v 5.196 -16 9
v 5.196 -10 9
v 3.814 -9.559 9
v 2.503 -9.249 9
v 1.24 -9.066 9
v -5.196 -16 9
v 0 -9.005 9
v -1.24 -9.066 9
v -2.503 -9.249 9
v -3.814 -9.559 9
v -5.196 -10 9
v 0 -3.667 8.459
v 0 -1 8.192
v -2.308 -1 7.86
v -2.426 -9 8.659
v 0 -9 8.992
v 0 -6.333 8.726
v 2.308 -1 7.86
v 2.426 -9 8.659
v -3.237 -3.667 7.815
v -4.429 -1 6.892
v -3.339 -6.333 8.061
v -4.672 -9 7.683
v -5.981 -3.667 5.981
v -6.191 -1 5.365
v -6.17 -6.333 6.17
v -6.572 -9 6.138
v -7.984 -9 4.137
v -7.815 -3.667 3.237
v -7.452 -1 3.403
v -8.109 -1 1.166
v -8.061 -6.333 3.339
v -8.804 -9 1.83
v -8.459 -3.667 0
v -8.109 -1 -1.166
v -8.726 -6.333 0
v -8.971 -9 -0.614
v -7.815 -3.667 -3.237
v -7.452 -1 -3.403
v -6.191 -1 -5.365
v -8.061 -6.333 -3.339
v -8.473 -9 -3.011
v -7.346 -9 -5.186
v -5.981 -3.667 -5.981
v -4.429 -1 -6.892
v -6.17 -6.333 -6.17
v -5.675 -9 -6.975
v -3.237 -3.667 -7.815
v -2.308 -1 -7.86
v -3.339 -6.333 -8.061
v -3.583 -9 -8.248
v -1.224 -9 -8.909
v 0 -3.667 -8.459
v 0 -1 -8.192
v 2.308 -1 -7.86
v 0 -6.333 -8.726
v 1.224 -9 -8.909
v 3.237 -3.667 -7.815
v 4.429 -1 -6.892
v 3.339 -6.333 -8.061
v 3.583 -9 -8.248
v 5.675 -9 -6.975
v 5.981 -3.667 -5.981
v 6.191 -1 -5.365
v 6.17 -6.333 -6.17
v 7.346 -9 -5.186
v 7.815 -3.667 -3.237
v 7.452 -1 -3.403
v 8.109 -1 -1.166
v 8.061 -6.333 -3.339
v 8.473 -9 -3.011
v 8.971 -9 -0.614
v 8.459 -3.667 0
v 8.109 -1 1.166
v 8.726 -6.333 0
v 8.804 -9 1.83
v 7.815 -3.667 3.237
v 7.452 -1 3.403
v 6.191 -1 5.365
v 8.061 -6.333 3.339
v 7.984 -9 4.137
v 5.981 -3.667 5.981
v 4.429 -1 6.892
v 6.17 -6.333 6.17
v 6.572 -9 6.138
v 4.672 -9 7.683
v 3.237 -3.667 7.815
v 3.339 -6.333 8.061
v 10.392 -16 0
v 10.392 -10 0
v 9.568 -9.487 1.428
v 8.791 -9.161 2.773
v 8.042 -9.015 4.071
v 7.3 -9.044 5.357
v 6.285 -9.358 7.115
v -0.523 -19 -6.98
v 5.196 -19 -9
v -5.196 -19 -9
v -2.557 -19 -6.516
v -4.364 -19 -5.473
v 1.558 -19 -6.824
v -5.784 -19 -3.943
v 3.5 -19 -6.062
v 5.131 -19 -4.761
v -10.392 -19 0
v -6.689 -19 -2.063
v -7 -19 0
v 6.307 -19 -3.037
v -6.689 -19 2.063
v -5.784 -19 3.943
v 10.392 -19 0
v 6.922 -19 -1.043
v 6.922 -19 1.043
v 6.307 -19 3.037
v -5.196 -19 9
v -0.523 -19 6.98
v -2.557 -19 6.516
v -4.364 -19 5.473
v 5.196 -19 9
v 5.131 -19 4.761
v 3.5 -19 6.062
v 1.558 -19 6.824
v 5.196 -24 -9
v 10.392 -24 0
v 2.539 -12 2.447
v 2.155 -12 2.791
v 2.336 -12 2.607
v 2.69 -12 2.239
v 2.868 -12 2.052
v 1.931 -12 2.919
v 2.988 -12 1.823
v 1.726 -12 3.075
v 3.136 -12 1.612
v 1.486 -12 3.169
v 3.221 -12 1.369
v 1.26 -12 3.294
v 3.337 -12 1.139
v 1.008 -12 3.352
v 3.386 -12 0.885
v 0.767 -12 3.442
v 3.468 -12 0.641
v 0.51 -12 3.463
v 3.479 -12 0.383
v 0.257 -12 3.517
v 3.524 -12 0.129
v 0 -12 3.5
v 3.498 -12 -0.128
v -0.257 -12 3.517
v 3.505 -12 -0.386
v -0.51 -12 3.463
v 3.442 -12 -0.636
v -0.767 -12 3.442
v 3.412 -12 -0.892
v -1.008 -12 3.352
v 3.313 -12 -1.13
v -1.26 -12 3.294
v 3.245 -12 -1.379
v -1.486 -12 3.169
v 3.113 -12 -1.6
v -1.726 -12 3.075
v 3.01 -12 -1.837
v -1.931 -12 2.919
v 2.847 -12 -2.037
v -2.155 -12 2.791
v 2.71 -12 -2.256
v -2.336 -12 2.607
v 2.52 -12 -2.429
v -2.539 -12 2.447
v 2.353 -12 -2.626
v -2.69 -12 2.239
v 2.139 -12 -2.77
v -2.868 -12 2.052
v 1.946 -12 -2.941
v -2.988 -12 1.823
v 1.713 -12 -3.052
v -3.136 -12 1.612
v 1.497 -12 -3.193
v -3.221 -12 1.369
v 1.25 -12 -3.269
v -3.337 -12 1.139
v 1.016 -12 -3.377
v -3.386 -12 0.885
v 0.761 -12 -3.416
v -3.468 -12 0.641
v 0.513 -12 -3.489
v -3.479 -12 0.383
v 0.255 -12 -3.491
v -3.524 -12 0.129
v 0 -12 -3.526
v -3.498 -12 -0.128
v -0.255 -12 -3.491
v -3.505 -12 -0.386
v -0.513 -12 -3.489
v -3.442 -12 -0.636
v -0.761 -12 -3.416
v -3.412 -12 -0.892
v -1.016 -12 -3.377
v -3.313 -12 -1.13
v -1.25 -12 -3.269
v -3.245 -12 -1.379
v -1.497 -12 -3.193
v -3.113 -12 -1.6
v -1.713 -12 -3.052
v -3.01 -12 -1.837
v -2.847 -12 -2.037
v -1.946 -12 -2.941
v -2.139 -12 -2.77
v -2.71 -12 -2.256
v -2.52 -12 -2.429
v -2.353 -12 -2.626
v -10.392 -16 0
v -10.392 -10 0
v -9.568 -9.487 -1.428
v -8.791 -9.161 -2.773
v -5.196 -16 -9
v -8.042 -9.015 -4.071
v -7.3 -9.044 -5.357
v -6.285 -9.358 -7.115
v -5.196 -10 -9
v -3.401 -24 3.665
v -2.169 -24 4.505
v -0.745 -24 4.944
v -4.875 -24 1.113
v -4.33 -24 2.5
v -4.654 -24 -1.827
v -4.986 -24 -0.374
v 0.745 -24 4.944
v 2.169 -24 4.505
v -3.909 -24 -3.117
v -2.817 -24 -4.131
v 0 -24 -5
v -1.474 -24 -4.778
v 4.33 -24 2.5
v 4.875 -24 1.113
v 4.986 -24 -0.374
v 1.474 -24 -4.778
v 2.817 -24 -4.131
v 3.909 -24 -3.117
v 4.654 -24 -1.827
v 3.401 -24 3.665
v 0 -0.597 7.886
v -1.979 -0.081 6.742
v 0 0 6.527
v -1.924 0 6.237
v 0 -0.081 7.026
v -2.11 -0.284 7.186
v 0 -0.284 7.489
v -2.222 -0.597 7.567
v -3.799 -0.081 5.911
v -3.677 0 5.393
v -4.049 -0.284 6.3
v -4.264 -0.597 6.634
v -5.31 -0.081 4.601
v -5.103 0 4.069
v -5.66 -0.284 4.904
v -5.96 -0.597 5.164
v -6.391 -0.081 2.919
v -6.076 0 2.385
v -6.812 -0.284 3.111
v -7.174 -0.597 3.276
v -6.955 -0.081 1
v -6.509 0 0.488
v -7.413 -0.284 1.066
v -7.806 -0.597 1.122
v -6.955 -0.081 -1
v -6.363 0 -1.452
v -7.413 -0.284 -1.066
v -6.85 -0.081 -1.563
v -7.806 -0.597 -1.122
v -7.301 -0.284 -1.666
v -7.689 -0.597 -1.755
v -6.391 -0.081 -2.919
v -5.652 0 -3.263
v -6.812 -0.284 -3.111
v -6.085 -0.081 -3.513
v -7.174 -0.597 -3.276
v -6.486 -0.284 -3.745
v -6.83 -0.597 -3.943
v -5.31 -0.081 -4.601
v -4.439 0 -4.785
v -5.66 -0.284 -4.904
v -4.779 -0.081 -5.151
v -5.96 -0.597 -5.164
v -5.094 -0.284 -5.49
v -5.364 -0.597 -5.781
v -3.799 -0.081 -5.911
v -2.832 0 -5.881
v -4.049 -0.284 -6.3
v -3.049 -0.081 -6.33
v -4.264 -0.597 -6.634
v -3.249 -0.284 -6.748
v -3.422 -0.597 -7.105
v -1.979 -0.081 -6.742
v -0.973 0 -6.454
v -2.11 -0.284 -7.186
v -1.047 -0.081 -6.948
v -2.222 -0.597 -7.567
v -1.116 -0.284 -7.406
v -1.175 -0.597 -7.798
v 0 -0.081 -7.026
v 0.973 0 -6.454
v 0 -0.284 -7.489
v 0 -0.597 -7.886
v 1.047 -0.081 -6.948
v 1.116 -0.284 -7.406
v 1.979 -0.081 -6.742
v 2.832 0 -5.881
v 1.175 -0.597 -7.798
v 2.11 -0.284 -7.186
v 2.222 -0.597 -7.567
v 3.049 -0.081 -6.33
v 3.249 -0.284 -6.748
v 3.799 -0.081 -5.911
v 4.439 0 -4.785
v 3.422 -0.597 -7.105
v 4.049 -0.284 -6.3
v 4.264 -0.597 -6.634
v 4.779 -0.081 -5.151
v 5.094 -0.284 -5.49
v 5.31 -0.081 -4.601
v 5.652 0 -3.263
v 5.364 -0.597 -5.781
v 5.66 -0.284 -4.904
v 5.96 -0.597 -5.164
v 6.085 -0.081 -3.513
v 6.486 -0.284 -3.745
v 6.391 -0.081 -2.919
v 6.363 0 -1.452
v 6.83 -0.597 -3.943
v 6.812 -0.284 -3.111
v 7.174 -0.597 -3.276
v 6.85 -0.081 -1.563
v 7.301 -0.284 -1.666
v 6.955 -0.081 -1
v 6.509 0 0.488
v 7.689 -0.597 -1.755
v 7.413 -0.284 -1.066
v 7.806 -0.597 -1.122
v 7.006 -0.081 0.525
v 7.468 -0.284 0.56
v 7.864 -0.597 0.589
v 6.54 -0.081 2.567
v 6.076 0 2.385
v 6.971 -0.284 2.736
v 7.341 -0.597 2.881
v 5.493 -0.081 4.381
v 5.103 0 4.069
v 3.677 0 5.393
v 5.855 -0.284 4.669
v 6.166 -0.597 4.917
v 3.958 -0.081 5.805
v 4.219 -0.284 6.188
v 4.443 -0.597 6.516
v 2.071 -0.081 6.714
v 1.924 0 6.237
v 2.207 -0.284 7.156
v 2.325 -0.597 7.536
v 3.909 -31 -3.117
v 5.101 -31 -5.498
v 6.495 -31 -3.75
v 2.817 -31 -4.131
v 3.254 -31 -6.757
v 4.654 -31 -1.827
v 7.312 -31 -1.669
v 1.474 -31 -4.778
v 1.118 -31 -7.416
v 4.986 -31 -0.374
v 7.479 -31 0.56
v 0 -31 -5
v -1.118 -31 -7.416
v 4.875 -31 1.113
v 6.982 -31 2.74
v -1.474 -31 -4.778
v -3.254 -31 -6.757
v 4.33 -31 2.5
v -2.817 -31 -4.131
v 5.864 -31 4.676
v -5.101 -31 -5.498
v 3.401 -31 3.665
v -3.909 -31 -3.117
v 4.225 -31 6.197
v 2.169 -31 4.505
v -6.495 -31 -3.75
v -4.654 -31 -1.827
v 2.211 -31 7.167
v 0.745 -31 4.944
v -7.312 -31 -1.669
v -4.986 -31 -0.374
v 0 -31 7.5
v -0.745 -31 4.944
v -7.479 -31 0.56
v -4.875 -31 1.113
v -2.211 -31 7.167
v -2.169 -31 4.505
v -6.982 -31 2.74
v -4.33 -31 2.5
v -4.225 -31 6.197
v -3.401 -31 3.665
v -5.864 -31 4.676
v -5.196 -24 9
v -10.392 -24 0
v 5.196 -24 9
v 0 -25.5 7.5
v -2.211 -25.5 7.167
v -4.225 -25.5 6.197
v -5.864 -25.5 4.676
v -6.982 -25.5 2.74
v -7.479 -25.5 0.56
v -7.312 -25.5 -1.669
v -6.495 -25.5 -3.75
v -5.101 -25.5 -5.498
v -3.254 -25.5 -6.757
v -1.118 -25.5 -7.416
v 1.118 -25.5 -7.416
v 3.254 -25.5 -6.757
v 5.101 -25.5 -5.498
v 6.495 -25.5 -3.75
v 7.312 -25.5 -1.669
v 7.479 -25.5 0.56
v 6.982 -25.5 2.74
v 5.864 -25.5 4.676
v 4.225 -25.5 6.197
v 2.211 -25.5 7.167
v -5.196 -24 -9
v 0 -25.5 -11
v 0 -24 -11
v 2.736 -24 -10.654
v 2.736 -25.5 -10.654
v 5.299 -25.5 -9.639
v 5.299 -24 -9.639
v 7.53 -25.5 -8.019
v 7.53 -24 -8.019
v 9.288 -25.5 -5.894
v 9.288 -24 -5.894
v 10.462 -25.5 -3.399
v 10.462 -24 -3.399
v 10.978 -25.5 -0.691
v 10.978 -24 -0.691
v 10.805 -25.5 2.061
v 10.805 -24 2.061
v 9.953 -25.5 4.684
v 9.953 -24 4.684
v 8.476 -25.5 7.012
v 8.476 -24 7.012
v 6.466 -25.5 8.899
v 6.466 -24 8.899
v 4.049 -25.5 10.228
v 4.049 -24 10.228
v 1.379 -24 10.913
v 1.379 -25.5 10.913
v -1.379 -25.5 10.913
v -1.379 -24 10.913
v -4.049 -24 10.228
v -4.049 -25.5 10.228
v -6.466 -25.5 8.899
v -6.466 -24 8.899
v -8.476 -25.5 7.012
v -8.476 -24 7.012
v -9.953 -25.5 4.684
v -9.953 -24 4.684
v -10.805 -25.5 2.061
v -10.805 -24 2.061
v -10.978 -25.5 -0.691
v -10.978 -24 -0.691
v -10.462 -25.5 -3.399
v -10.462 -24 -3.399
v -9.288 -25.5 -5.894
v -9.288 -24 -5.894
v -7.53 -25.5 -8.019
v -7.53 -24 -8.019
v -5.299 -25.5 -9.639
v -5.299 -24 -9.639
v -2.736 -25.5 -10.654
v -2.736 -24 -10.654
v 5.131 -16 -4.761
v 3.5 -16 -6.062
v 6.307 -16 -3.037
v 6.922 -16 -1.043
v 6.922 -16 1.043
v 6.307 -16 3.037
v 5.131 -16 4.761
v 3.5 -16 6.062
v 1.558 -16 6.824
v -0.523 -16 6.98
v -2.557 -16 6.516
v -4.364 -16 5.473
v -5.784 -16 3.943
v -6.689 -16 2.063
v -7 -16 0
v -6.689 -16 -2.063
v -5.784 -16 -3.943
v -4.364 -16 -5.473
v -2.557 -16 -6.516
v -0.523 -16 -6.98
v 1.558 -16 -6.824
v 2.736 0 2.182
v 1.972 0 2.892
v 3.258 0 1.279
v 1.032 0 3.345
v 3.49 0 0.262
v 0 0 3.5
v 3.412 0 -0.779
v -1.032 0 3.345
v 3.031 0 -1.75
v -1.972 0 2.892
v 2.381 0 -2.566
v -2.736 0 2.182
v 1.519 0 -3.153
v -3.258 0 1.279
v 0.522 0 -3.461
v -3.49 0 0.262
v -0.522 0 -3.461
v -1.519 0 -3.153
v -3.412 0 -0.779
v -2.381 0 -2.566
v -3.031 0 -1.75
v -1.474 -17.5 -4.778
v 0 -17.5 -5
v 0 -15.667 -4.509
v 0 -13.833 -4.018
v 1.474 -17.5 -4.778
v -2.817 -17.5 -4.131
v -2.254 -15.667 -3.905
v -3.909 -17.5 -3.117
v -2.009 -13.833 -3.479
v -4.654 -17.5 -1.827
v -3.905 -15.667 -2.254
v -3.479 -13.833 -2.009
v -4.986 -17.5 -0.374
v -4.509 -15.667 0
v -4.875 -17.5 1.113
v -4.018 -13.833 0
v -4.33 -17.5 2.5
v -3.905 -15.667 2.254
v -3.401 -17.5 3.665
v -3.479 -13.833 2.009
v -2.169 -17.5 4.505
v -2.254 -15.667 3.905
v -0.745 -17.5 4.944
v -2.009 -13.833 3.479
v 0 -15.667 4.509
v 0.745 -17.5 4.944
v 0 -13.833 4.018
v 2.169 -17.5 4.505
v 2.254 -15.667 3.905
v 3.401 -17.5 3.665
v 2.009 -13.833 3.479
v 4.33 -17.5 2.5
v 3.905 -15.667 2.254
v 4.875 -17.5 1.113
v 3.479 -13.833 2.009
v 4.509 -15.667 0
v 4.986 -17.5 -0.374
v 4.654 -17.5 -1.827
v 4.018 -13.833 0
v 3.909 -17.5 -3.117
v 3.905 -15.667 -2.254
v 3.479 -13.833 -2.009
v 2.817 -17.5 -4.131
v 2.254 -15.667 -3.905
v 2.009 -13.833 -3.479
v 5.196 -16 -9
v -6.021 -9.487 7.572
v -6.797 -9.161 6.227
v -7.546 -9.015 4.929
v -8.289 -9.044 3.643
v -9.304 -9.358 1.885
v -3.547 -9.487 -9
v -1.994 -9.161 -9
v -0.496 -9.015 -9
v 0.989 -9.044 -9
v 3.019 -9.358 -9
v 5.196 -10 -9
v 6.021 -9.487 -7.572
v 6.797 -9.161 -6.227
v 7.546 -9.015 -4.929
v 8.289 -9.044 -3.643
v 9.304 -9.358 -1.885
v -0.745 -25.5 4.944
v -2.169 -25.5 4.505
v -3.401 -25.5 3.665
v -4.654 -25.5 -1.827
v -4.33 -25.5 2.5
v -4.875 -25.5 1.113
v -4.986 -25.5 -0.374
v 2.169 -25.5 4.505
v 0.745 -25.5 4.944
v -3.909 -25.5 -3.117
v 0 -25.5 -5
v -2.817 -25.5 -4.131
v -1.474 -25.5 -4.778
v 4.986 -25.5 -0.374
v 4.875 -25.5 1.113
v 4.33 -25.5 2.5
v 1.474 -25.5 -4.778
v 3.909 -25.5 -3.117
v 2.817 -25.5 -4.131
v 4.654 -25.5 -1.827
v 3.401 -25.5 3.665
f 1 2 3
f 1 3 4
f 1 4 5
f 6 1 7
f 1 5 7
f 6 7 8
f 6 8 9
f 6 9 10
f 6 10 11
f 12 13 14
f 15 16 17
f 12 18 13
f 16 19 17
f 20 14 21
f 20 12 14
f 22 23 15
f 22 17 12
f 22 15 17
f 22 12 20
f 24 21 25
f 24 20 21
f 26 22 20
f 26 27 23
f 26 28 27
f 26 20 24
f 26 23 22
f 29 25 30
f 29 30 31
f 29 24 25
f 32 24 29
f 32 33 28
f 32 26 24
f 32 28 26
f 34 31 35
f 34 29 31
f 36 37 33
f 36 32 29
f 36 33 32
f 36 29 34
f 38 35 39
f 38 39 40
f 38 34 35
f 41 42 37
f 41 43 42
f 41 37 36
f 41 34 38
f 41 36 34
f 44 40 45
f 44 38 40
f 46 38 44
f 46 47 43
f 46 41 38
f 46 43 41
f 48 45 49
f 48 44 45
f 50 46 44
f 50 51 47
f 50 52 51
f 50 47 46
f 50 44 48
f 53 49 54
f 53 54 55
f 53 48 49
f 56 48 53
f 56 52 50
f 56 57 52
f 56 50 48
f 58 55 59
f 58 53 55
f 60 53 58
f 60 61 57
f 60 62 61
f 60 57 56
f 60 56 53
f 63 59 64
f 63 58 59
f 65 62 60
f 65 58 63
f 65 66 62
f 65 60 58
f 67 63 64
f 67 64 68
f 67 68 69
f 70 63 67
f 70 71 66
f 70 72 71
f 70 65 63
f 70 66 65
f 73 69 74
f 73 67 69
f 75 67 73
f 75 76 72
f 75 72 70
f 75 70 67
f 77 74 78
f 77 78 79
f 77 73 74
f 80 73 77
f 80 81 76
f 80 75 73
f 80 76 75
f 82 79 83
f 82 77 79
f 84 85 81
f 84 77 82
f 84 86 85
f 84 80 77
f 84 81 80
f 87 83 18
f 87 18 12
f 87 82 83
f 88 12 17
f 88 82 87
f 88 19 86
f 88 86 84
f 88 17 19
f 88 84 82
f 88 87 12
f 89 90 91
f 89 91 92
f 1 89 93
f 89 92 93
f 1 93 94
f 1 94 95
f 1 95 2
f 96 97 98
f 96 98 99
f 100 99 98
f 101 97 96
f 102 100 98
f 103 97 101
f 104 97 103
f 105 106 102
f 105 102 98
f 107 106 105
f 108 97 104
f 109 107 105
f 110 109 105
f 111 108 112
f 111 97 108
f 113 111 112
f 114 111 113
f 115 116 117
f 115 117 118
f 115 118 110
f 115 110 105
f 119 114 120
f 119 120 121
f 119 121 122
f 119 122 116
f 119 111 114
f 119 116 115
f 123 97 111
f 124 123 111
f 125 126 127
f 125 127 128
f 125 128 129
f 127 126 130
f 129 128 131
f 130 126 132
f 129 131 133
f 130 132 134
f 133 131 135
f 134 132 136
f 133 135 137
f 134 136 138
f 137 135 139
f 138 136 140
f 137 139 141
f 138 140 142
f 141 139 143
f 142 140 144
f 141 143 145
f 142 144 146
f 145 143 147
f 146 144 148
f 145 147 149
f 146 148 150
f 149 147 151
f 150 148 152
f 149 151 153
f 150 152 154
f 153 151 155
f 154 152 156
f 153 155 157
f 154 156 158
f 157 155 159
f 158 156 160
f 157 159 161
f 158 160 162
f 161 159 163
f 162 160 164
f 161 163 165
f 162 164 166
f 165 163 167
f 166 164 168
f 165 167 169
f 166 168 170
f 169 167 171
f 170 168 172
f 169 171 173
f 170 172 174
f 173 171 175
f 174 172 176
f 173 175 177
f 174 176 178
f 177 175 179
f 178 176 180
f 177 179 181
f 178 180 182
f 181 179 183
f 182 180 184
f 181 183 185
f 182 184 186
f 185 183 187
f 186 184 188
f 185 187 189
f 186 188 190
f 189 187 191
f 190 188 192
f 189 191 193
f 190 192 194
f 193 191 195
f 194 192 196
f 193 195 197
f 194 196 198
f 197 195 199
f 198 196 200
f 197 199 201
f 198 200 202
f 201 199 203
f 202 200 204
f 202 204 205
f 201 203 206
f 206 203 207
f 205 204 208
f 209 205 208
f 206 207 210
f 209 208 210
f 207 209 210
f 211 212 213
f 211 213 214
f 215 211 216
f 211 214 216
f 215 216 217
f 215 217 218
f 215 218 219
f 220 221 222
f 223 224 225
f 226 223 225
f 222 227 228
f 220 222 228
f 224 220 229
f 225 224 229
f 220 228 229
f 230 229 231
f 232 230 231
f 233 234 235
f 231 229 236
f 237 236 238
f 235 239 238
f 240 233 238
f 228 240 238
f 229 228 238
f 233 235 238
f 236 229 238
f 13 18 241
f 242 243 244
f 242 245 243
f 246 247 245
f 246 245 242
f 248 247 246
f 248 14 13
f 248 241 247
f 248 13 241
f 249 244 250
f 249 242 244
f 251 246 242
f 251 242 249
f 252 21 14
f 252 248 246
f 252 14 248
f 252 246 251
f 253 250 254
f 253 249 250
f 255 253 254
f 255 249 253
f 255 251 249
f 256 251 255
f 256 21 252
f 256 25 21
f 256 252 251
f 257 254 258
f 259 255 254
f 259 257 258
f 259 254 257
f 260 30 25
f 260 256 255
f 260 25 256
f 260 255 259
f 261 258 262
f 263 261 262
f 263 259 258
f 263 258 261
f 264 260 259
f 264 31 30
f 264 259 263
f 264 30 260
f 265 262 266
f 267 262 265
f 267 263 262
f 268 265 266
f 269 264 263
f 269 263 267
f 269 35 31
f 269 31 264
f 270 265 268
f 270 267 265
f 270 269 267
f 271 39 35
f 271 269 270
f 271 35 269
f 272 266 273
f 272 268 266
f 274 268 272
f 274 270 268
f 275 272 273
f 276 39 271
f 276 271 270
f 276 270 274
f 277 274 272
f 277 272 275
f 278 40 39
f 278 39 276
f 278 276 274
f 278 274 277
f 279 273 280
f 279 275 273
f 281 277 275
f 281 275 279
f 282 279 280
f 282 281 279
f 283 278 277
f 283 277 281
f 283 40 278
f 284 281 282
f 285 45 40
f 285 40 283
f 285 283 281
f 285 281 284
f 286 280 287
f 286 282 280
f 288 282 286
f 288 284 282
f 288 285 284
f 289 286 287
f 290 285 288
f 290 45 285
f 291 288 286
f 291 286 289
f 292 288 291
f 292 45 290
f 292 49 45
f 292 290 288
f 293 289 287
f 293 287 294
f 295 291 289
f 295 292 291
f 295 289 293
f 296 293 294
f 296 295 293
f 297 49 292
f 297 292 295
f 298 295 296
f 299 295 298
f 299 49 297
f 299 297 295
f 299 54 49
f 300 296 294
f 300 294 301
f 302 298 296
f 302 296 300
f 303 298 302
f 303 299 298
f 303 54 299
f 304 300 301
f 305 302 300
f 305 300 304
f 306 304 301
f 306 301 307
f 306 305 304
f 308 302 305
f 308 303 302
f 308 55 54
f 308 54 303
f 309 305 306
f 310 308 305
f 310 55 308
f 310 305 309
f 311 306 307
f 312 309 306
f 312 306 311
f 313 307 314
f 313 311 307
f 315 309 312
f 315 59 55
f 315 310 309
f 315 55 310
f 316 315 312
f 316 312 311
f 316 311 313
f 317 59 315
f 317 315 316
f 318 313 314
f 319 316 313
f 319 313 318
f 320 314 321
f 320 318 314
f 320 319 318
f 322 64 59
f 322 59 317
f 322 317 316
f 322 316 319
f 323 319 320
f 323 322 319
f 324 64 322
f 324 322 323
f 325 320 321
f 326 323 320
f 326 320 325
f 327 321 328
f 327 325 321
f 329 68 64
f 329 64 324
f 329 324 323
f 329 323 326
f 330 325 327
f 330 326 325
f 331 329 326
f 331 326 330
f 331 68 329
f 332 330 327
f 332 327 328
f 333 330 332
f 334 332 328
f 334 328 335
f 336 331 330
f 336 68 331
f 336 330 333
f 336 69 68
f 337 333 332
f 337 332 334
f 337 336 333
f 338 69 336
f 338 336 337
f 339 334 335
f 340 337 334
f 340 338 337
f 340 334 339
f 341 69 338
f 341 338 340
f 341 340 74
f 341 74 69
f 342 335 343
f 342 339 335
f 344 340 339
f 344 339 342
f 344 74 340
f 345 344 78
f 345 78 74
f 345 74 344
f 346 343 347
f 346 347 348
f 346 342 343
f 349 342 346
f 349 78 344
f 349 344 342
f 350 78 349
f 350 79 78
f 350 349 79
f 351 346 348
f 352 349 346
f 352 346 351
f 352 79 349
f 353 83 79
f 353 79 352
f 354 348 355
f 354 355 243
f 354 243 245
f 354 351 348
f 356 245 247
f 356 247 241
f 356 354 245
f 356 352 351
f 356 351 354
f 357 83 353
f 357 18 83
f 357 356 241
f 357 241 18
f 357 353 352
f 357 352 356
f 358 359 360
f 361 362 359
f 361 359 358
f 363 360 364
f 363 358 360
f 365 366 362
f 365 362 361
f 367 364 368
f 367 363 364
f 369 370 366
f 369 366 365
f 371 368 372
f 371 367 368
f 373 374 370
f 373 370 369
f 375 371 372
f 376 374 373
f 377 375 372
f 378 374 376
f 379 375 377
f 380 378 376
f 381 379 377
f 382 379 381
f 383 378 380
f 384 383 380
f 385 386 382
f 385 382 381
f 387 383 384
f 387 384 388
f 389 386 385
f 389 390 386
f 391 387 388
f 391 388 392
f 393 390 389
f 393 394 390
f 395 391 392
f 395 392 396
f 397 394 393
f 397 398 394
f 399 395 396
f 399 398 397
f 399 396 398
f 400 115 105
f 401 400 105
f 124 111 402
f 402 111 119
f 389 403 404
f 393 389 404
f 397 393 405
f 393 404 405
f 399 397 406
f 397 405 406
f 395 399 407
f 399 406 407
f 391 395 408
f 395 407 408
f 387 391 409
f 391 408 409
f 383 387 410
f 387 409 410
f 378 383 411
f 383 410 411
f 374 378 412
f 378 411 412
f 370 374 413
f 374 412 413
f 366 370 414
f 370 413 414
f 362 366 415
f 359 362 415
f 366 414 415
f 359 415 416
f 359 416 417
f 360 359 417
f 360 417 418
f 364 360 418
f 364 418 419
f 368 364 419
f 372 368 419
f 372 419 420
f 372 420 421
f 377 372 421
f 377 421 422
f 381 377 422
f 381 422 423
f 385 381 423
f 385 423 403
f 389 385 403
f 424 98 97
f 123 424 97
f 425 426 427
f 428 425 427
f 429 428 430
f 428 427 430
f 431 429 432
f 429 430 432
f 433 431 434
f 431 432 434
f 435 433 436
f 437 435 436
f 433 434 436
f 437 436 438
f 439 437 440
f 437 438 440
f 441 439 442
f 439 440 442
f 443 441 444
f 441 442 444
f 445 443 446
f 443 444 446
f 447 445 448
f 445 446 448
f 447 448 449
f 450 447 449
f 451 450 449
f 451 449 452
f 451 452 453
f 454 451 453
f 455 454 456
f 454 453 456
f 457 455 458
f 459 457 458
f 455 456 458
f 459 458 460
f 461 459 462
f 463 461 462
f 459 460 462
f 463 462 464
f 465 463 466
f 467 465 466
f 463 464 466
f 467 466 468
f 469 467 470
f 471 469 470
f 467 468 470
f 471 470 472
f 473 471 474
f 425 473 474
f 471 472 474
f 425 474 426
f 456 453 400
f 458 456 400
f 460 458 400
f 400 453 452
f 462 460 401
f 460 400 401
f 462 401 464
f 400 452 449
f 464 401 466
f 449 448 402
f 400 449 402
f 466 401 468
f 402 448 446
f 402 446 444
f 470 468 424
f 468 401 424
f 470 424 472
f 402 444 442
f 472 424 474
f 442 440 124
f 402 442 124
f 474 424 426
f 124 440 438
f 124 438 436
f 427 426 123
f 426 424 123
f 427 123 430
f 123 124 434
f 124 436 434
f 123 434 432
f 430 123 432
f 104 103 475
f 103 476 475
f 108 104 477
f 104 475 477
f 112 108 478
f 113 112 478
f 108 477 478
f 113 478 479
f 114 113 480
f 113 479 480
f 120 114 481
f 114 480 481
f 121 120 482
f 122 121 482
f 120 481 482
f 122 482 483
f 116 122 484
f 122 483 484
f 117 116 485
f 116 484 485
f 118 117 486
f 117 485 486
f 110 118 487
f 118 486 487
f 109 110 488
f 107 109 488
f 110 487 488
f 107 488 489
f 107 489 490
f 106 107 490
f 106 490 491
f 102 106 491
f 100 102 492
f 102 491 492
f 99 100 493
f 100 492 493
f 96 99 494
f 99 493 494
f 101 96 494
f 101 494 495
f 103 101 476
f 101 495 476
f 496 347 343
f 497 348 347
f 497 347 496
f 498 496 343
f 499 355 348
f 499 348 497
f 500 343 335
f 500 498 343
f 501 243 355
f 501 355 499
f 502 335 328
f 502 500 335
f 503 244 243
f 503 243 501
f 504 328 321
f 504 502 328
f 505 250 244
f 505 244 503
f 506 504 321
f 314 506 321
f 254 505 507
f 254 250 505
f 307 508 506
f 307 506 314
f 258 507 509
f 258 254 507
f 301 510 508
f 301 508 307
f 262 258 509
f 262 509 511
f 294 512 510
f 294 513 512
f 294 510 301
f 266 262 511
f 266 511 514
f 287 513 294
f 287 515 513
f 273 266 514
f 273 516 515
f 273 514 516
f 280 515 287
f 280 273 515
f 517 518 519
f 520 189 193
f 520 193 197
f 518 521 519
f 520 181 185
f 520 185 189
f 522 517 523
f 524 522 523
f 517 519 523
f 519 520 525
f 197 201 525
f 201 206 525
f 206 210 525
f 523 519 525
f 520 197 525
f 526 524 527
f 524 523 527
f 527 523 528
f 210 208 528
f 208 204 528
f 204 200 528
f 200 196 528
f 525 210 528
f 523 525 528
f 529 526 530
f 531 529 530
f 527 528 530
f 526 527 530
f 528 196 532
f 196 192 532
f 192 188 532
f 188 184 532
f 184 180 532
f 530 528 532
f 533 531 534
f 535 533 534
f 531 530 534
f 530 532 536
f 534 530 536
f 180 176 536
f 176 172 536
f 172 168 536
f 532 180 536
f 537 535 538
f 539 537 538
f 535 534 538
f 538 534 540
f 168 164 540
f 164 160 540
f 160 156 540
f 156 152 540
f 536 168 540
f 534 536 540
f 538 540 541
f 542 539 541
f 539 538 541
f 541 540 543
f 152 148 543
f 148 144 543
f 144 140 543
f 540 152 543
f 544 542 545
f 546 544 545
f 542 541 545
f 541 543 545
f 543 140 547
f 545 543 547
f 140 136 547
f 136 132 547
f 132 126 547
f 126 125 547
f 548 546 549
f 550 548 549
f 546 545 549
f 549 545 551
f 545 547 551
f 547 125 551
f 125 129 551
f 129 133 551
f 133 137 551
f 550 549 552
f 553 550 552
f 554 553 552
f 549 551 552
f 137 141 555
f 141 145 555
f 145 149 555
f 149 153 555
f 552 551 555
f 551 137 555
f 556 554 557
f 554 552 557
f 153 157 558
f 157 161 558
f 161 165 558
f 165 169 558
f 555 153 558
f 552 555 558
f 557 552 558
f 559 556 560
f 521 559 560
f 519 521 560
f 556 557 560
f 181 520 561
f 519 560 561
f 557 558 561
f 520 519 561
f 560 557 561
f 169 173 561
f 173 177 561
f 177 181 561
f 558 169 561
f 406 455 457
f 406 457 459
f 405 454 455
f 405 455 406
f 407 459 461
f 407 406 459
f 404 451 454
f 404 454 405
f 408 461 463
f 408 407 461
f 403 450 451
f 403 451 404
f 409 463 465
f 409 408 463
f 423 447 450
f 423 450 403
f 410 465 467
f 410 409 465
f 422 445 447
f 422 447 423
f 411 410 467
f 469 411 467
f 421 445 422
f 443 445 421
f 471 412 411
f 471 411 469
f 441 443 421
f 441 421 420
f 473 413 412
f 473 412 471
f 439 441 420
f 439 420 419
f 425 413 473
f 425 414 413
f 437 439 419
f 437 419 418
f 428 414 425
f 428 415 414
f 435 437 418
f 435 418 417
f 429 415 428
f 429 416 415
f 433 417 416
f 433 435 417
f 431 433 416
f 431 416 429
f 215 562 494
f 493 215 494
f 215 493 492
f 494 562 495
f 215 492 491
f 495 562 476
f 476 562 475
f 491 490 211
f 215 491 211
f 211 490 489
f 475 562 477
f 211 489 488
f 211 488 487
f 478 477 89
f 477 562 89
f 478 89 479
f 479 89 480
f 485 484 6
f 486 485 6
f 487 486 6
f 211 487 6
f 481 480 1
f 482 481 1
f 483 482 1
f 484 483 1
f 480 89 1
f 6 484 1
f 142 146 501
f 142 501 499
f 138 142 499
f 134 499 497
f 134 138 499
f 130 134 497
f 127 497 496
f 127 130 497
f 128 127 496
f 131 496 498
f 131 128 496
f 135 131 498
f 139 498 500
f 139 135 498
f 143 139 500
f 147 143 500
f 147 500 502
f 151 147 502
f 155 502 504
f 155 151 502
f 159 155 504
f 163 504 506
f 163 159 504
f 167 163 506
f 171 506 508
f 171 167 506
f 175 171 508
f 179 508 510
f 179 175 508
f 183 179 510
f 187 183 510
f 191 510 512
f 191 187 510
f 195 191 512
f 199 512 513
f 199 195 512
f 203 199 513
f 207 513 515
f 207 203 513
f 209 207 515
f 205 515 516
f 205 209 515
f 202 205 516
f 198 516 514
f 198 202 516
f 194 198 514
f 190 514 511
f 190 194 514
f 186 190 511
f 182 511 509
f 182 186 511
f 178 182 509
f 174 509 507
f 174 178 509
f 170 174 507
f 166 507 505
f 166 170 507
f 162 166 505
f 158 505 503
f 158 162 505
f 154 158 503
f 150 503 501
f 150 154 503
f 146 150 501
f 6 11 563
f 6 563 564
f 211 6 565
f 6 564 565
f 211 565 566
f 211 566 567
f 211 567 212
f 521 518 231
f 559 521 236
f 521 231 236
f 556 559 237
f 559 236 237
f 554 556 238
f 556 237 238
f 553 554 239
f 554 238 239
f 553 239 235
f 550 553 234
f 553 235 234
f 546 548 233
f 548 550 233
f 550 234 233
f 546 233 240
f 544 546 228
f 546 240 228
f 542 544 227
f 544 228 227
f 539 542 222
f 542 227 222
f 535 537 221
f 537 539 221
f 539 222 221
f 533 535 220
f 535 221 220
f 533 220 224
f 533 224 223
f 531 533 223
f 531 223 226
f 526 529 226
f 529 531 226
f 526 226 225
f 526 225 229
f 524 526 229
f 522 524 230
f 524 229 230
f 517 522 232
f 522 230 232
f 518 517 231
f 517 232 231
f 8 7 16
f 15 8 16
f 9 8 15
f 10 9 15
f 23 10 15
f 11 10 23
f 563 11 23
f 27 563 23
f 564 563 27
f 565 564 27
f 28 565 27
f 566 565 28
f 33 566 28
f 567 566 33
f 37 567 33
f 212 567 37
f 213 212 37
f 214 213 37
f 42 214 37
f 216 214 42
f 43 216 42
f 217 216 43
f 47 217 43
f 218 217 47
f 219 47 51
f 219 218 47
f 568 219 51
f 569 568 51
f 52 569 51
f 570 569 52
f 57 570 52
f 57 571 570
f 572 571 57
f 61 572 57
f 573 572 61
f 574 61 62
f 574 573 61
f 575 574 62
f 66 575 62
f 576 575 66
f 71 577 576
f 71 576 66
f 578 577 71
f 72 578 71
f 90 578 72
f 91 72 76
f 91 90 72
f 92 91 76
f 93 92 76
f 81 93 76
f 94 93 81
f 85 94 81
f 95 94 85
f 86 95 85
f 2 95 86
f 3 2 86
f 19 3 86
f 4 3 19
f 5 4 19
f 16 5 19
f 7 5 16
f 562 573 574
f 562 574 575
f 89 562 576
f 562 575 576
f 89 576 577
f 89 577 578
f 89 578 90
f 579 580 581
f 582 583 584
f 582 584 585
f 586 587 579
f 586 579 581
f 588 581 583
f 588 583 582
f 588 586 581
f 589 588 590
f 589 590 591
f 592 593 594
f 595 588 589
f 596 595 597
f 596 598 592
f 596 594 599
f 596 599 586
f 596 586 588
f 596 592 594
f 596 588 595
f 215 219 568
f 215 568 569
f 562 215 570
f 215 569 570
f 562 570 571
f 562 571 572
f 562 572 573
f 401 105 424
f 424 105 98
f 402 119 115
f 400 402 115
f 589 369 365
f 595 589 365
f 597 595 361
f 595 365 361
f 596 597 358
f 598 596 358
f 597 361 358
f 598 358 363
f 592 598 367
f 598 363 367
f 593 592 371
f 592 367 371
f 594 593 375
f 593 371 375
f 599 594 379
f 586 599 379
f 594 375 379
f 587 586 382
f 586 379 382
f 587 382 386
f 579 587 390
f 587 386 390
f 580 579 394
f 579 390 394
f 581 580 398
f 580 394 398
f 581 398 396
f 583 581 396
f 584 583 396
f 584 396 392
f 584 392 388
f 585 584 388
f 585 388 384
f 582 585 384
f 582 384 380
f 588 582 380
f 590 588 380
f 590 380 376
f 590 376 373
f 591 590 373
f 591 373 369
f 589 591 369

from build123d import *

# Parameters (mm, degrees)
EXTRUDE_1_DEPTH     = 24
SKETCH_3_W          = 3.392304845
SKETCH_3_H          = 3
SKETCH_4_R          = 7.5
EXTRUDE_2_DEPTH     = 7
SKETCH_5_R          = 5
CUT_EXTRUDE_1_DEPTH = 34.911649916
EXTRUDE_START       = -12
SKETCH_6_R          = 5
SKETCH_6_R_2        = 3.5
EXTRUDE_3_DEPTH     = 12
CHAMFER_1_SIZE      = 5.5
CHAMFER_1_SIZE2     = 1.473720558
SKETCH_7_R          = 11
EXTRUDE_4_DEPTH     = 1.5


with BuildPart() as part:
    # Эскиз1 → Вытянуть1 (new body)
    with BuildSketch(Plane(origin=(0, 0, 0), x_dir=(1, 0, 0), z_dir=(0, 1, 0))):
        Polygon((-5.196152423, 9), (5.196152423, 9), (10.392304845, 0), (5.196152423, -9), (-5.196152423, -9), (-10.392304845, 0), align=None)
    extrude(amount=-EXTRUDE_1_DEPTH)

    # Эскиз2 → Вырез-Повернуть1 (revolve, cut)
    with BuildSketch(Plane.XY, mode=Mode.PRIVATE) as cut_revolve_1_sk:
        with BuildLine():
            Line((8.992304845, -9), (10.392304845, -10))
            Line((10.392304845, -10), (11.881416036, -10))
            Line((11.881416036, -10), (11.881416036, 2.231526293))
            Line((11.881416036, 2.231526293), (6.392304845, 2.231526293))
            Line((6.392304845, 2.231526293), (6.392304845, 0))
            ThreePointArc((6.392304845, 0), (7.430886543, -0.250552945), (8.192304845, -1))
            Line((8.192304845, -1), (8.992304845, -9))
        make_face()
    revolve(cut_revolve_1_sk.sketch.rotate(Axis((0, 9.980849864, 0), (0, -1, 0)), 90), axis=Axis((0, 9.980849864, 0), (0, -1, 0)), mode=Mode.SUBTRACT)

    # Эскиз3 → Вырез-Повернуть2 (revolve, cut)
    with BuildSketch(Plane.XY, mode=Mode.PRIVATE) as cut_revolve_2_sk:
        with Locations((8.696152422, -17.5)):
            Rectangle(SKETCH_3_W, SKETCH_3_H)
    revolve(cut_revolve_2_sk.sketch.rotate(Axis((0, 9.980849864, 0), (0, -1, 0)), 300.000000019), axis=Axis((0, 9.980849864, 0), (0, -1, 0)), mode=Mode.SUBTRACT)

    # Эскиз4 → Вытянуть2 (add)
    with BuildSketch(Plane.XZ.offset(24)):
        with Locations(Location((0, 0, 0), (0, 0, 90))):
            Circle(SKETCH_4_R)
    extrude(amount=EXTRUDE_2_DEPTH)

    # Эскиз5 → Вырез-Вытянуть1 (cut, through all)
    with BuildSketch(Plane.XZ.offset(31)):
        with Locations(Location((0, 0, 0), (0, 0, 270))):
            Circle(SKETCH_5_R)
    extrude(amount=-CUT_EXTRUDE_1_DEPTH, mode=Mode.SUBTRACT)

    # Эскиз6 → Вытянуть3 (add)
    with BuildSketch(Plane(origin=(0, 0, 0), x_dir=(-1, 0, 0), z_dir=(0, 1, 0)).offset(EXTRUDE_START)):
        with Locations(Location((0, 0, 0), (0, 0, 270))):
            Circle(SKETCH_6_R)
        with Locations(Location((0, 0, 0), (0, 0, 90))):
            Circle(SKETCH_6_R_2, mode=Mode.SUBTRACT)
    extrude(amount=EXTRUDE_3_DEPTH)

    # Фаска1
    chamfer_1_edges = [part.edges().sort_by_distance(p)[0] for p in [
        (0, -12, 5),
    ]]
    chamfer_1_side = [part.faces().sort_by_distance(p)[0] for p in [
        (0, -21.5, 5),
    ]]
    chamfer(chamfer_1_edges, length=CHAMFER_1_SIZE, length2=CHAMFER_1_SIZE2, reference=chamfer_1_side[0])

    # Эскиз7 → Вытянуть4 (add)
    with BuildSketch(Plane.XZ.offset(24)):
        with Locations(Location((0, 0, 0), (0, 0, 270))):
            Circle(SKETCH_7_R)
    extrude(amount=EXTRUDE_4_DEPTH)


solid = part.part
